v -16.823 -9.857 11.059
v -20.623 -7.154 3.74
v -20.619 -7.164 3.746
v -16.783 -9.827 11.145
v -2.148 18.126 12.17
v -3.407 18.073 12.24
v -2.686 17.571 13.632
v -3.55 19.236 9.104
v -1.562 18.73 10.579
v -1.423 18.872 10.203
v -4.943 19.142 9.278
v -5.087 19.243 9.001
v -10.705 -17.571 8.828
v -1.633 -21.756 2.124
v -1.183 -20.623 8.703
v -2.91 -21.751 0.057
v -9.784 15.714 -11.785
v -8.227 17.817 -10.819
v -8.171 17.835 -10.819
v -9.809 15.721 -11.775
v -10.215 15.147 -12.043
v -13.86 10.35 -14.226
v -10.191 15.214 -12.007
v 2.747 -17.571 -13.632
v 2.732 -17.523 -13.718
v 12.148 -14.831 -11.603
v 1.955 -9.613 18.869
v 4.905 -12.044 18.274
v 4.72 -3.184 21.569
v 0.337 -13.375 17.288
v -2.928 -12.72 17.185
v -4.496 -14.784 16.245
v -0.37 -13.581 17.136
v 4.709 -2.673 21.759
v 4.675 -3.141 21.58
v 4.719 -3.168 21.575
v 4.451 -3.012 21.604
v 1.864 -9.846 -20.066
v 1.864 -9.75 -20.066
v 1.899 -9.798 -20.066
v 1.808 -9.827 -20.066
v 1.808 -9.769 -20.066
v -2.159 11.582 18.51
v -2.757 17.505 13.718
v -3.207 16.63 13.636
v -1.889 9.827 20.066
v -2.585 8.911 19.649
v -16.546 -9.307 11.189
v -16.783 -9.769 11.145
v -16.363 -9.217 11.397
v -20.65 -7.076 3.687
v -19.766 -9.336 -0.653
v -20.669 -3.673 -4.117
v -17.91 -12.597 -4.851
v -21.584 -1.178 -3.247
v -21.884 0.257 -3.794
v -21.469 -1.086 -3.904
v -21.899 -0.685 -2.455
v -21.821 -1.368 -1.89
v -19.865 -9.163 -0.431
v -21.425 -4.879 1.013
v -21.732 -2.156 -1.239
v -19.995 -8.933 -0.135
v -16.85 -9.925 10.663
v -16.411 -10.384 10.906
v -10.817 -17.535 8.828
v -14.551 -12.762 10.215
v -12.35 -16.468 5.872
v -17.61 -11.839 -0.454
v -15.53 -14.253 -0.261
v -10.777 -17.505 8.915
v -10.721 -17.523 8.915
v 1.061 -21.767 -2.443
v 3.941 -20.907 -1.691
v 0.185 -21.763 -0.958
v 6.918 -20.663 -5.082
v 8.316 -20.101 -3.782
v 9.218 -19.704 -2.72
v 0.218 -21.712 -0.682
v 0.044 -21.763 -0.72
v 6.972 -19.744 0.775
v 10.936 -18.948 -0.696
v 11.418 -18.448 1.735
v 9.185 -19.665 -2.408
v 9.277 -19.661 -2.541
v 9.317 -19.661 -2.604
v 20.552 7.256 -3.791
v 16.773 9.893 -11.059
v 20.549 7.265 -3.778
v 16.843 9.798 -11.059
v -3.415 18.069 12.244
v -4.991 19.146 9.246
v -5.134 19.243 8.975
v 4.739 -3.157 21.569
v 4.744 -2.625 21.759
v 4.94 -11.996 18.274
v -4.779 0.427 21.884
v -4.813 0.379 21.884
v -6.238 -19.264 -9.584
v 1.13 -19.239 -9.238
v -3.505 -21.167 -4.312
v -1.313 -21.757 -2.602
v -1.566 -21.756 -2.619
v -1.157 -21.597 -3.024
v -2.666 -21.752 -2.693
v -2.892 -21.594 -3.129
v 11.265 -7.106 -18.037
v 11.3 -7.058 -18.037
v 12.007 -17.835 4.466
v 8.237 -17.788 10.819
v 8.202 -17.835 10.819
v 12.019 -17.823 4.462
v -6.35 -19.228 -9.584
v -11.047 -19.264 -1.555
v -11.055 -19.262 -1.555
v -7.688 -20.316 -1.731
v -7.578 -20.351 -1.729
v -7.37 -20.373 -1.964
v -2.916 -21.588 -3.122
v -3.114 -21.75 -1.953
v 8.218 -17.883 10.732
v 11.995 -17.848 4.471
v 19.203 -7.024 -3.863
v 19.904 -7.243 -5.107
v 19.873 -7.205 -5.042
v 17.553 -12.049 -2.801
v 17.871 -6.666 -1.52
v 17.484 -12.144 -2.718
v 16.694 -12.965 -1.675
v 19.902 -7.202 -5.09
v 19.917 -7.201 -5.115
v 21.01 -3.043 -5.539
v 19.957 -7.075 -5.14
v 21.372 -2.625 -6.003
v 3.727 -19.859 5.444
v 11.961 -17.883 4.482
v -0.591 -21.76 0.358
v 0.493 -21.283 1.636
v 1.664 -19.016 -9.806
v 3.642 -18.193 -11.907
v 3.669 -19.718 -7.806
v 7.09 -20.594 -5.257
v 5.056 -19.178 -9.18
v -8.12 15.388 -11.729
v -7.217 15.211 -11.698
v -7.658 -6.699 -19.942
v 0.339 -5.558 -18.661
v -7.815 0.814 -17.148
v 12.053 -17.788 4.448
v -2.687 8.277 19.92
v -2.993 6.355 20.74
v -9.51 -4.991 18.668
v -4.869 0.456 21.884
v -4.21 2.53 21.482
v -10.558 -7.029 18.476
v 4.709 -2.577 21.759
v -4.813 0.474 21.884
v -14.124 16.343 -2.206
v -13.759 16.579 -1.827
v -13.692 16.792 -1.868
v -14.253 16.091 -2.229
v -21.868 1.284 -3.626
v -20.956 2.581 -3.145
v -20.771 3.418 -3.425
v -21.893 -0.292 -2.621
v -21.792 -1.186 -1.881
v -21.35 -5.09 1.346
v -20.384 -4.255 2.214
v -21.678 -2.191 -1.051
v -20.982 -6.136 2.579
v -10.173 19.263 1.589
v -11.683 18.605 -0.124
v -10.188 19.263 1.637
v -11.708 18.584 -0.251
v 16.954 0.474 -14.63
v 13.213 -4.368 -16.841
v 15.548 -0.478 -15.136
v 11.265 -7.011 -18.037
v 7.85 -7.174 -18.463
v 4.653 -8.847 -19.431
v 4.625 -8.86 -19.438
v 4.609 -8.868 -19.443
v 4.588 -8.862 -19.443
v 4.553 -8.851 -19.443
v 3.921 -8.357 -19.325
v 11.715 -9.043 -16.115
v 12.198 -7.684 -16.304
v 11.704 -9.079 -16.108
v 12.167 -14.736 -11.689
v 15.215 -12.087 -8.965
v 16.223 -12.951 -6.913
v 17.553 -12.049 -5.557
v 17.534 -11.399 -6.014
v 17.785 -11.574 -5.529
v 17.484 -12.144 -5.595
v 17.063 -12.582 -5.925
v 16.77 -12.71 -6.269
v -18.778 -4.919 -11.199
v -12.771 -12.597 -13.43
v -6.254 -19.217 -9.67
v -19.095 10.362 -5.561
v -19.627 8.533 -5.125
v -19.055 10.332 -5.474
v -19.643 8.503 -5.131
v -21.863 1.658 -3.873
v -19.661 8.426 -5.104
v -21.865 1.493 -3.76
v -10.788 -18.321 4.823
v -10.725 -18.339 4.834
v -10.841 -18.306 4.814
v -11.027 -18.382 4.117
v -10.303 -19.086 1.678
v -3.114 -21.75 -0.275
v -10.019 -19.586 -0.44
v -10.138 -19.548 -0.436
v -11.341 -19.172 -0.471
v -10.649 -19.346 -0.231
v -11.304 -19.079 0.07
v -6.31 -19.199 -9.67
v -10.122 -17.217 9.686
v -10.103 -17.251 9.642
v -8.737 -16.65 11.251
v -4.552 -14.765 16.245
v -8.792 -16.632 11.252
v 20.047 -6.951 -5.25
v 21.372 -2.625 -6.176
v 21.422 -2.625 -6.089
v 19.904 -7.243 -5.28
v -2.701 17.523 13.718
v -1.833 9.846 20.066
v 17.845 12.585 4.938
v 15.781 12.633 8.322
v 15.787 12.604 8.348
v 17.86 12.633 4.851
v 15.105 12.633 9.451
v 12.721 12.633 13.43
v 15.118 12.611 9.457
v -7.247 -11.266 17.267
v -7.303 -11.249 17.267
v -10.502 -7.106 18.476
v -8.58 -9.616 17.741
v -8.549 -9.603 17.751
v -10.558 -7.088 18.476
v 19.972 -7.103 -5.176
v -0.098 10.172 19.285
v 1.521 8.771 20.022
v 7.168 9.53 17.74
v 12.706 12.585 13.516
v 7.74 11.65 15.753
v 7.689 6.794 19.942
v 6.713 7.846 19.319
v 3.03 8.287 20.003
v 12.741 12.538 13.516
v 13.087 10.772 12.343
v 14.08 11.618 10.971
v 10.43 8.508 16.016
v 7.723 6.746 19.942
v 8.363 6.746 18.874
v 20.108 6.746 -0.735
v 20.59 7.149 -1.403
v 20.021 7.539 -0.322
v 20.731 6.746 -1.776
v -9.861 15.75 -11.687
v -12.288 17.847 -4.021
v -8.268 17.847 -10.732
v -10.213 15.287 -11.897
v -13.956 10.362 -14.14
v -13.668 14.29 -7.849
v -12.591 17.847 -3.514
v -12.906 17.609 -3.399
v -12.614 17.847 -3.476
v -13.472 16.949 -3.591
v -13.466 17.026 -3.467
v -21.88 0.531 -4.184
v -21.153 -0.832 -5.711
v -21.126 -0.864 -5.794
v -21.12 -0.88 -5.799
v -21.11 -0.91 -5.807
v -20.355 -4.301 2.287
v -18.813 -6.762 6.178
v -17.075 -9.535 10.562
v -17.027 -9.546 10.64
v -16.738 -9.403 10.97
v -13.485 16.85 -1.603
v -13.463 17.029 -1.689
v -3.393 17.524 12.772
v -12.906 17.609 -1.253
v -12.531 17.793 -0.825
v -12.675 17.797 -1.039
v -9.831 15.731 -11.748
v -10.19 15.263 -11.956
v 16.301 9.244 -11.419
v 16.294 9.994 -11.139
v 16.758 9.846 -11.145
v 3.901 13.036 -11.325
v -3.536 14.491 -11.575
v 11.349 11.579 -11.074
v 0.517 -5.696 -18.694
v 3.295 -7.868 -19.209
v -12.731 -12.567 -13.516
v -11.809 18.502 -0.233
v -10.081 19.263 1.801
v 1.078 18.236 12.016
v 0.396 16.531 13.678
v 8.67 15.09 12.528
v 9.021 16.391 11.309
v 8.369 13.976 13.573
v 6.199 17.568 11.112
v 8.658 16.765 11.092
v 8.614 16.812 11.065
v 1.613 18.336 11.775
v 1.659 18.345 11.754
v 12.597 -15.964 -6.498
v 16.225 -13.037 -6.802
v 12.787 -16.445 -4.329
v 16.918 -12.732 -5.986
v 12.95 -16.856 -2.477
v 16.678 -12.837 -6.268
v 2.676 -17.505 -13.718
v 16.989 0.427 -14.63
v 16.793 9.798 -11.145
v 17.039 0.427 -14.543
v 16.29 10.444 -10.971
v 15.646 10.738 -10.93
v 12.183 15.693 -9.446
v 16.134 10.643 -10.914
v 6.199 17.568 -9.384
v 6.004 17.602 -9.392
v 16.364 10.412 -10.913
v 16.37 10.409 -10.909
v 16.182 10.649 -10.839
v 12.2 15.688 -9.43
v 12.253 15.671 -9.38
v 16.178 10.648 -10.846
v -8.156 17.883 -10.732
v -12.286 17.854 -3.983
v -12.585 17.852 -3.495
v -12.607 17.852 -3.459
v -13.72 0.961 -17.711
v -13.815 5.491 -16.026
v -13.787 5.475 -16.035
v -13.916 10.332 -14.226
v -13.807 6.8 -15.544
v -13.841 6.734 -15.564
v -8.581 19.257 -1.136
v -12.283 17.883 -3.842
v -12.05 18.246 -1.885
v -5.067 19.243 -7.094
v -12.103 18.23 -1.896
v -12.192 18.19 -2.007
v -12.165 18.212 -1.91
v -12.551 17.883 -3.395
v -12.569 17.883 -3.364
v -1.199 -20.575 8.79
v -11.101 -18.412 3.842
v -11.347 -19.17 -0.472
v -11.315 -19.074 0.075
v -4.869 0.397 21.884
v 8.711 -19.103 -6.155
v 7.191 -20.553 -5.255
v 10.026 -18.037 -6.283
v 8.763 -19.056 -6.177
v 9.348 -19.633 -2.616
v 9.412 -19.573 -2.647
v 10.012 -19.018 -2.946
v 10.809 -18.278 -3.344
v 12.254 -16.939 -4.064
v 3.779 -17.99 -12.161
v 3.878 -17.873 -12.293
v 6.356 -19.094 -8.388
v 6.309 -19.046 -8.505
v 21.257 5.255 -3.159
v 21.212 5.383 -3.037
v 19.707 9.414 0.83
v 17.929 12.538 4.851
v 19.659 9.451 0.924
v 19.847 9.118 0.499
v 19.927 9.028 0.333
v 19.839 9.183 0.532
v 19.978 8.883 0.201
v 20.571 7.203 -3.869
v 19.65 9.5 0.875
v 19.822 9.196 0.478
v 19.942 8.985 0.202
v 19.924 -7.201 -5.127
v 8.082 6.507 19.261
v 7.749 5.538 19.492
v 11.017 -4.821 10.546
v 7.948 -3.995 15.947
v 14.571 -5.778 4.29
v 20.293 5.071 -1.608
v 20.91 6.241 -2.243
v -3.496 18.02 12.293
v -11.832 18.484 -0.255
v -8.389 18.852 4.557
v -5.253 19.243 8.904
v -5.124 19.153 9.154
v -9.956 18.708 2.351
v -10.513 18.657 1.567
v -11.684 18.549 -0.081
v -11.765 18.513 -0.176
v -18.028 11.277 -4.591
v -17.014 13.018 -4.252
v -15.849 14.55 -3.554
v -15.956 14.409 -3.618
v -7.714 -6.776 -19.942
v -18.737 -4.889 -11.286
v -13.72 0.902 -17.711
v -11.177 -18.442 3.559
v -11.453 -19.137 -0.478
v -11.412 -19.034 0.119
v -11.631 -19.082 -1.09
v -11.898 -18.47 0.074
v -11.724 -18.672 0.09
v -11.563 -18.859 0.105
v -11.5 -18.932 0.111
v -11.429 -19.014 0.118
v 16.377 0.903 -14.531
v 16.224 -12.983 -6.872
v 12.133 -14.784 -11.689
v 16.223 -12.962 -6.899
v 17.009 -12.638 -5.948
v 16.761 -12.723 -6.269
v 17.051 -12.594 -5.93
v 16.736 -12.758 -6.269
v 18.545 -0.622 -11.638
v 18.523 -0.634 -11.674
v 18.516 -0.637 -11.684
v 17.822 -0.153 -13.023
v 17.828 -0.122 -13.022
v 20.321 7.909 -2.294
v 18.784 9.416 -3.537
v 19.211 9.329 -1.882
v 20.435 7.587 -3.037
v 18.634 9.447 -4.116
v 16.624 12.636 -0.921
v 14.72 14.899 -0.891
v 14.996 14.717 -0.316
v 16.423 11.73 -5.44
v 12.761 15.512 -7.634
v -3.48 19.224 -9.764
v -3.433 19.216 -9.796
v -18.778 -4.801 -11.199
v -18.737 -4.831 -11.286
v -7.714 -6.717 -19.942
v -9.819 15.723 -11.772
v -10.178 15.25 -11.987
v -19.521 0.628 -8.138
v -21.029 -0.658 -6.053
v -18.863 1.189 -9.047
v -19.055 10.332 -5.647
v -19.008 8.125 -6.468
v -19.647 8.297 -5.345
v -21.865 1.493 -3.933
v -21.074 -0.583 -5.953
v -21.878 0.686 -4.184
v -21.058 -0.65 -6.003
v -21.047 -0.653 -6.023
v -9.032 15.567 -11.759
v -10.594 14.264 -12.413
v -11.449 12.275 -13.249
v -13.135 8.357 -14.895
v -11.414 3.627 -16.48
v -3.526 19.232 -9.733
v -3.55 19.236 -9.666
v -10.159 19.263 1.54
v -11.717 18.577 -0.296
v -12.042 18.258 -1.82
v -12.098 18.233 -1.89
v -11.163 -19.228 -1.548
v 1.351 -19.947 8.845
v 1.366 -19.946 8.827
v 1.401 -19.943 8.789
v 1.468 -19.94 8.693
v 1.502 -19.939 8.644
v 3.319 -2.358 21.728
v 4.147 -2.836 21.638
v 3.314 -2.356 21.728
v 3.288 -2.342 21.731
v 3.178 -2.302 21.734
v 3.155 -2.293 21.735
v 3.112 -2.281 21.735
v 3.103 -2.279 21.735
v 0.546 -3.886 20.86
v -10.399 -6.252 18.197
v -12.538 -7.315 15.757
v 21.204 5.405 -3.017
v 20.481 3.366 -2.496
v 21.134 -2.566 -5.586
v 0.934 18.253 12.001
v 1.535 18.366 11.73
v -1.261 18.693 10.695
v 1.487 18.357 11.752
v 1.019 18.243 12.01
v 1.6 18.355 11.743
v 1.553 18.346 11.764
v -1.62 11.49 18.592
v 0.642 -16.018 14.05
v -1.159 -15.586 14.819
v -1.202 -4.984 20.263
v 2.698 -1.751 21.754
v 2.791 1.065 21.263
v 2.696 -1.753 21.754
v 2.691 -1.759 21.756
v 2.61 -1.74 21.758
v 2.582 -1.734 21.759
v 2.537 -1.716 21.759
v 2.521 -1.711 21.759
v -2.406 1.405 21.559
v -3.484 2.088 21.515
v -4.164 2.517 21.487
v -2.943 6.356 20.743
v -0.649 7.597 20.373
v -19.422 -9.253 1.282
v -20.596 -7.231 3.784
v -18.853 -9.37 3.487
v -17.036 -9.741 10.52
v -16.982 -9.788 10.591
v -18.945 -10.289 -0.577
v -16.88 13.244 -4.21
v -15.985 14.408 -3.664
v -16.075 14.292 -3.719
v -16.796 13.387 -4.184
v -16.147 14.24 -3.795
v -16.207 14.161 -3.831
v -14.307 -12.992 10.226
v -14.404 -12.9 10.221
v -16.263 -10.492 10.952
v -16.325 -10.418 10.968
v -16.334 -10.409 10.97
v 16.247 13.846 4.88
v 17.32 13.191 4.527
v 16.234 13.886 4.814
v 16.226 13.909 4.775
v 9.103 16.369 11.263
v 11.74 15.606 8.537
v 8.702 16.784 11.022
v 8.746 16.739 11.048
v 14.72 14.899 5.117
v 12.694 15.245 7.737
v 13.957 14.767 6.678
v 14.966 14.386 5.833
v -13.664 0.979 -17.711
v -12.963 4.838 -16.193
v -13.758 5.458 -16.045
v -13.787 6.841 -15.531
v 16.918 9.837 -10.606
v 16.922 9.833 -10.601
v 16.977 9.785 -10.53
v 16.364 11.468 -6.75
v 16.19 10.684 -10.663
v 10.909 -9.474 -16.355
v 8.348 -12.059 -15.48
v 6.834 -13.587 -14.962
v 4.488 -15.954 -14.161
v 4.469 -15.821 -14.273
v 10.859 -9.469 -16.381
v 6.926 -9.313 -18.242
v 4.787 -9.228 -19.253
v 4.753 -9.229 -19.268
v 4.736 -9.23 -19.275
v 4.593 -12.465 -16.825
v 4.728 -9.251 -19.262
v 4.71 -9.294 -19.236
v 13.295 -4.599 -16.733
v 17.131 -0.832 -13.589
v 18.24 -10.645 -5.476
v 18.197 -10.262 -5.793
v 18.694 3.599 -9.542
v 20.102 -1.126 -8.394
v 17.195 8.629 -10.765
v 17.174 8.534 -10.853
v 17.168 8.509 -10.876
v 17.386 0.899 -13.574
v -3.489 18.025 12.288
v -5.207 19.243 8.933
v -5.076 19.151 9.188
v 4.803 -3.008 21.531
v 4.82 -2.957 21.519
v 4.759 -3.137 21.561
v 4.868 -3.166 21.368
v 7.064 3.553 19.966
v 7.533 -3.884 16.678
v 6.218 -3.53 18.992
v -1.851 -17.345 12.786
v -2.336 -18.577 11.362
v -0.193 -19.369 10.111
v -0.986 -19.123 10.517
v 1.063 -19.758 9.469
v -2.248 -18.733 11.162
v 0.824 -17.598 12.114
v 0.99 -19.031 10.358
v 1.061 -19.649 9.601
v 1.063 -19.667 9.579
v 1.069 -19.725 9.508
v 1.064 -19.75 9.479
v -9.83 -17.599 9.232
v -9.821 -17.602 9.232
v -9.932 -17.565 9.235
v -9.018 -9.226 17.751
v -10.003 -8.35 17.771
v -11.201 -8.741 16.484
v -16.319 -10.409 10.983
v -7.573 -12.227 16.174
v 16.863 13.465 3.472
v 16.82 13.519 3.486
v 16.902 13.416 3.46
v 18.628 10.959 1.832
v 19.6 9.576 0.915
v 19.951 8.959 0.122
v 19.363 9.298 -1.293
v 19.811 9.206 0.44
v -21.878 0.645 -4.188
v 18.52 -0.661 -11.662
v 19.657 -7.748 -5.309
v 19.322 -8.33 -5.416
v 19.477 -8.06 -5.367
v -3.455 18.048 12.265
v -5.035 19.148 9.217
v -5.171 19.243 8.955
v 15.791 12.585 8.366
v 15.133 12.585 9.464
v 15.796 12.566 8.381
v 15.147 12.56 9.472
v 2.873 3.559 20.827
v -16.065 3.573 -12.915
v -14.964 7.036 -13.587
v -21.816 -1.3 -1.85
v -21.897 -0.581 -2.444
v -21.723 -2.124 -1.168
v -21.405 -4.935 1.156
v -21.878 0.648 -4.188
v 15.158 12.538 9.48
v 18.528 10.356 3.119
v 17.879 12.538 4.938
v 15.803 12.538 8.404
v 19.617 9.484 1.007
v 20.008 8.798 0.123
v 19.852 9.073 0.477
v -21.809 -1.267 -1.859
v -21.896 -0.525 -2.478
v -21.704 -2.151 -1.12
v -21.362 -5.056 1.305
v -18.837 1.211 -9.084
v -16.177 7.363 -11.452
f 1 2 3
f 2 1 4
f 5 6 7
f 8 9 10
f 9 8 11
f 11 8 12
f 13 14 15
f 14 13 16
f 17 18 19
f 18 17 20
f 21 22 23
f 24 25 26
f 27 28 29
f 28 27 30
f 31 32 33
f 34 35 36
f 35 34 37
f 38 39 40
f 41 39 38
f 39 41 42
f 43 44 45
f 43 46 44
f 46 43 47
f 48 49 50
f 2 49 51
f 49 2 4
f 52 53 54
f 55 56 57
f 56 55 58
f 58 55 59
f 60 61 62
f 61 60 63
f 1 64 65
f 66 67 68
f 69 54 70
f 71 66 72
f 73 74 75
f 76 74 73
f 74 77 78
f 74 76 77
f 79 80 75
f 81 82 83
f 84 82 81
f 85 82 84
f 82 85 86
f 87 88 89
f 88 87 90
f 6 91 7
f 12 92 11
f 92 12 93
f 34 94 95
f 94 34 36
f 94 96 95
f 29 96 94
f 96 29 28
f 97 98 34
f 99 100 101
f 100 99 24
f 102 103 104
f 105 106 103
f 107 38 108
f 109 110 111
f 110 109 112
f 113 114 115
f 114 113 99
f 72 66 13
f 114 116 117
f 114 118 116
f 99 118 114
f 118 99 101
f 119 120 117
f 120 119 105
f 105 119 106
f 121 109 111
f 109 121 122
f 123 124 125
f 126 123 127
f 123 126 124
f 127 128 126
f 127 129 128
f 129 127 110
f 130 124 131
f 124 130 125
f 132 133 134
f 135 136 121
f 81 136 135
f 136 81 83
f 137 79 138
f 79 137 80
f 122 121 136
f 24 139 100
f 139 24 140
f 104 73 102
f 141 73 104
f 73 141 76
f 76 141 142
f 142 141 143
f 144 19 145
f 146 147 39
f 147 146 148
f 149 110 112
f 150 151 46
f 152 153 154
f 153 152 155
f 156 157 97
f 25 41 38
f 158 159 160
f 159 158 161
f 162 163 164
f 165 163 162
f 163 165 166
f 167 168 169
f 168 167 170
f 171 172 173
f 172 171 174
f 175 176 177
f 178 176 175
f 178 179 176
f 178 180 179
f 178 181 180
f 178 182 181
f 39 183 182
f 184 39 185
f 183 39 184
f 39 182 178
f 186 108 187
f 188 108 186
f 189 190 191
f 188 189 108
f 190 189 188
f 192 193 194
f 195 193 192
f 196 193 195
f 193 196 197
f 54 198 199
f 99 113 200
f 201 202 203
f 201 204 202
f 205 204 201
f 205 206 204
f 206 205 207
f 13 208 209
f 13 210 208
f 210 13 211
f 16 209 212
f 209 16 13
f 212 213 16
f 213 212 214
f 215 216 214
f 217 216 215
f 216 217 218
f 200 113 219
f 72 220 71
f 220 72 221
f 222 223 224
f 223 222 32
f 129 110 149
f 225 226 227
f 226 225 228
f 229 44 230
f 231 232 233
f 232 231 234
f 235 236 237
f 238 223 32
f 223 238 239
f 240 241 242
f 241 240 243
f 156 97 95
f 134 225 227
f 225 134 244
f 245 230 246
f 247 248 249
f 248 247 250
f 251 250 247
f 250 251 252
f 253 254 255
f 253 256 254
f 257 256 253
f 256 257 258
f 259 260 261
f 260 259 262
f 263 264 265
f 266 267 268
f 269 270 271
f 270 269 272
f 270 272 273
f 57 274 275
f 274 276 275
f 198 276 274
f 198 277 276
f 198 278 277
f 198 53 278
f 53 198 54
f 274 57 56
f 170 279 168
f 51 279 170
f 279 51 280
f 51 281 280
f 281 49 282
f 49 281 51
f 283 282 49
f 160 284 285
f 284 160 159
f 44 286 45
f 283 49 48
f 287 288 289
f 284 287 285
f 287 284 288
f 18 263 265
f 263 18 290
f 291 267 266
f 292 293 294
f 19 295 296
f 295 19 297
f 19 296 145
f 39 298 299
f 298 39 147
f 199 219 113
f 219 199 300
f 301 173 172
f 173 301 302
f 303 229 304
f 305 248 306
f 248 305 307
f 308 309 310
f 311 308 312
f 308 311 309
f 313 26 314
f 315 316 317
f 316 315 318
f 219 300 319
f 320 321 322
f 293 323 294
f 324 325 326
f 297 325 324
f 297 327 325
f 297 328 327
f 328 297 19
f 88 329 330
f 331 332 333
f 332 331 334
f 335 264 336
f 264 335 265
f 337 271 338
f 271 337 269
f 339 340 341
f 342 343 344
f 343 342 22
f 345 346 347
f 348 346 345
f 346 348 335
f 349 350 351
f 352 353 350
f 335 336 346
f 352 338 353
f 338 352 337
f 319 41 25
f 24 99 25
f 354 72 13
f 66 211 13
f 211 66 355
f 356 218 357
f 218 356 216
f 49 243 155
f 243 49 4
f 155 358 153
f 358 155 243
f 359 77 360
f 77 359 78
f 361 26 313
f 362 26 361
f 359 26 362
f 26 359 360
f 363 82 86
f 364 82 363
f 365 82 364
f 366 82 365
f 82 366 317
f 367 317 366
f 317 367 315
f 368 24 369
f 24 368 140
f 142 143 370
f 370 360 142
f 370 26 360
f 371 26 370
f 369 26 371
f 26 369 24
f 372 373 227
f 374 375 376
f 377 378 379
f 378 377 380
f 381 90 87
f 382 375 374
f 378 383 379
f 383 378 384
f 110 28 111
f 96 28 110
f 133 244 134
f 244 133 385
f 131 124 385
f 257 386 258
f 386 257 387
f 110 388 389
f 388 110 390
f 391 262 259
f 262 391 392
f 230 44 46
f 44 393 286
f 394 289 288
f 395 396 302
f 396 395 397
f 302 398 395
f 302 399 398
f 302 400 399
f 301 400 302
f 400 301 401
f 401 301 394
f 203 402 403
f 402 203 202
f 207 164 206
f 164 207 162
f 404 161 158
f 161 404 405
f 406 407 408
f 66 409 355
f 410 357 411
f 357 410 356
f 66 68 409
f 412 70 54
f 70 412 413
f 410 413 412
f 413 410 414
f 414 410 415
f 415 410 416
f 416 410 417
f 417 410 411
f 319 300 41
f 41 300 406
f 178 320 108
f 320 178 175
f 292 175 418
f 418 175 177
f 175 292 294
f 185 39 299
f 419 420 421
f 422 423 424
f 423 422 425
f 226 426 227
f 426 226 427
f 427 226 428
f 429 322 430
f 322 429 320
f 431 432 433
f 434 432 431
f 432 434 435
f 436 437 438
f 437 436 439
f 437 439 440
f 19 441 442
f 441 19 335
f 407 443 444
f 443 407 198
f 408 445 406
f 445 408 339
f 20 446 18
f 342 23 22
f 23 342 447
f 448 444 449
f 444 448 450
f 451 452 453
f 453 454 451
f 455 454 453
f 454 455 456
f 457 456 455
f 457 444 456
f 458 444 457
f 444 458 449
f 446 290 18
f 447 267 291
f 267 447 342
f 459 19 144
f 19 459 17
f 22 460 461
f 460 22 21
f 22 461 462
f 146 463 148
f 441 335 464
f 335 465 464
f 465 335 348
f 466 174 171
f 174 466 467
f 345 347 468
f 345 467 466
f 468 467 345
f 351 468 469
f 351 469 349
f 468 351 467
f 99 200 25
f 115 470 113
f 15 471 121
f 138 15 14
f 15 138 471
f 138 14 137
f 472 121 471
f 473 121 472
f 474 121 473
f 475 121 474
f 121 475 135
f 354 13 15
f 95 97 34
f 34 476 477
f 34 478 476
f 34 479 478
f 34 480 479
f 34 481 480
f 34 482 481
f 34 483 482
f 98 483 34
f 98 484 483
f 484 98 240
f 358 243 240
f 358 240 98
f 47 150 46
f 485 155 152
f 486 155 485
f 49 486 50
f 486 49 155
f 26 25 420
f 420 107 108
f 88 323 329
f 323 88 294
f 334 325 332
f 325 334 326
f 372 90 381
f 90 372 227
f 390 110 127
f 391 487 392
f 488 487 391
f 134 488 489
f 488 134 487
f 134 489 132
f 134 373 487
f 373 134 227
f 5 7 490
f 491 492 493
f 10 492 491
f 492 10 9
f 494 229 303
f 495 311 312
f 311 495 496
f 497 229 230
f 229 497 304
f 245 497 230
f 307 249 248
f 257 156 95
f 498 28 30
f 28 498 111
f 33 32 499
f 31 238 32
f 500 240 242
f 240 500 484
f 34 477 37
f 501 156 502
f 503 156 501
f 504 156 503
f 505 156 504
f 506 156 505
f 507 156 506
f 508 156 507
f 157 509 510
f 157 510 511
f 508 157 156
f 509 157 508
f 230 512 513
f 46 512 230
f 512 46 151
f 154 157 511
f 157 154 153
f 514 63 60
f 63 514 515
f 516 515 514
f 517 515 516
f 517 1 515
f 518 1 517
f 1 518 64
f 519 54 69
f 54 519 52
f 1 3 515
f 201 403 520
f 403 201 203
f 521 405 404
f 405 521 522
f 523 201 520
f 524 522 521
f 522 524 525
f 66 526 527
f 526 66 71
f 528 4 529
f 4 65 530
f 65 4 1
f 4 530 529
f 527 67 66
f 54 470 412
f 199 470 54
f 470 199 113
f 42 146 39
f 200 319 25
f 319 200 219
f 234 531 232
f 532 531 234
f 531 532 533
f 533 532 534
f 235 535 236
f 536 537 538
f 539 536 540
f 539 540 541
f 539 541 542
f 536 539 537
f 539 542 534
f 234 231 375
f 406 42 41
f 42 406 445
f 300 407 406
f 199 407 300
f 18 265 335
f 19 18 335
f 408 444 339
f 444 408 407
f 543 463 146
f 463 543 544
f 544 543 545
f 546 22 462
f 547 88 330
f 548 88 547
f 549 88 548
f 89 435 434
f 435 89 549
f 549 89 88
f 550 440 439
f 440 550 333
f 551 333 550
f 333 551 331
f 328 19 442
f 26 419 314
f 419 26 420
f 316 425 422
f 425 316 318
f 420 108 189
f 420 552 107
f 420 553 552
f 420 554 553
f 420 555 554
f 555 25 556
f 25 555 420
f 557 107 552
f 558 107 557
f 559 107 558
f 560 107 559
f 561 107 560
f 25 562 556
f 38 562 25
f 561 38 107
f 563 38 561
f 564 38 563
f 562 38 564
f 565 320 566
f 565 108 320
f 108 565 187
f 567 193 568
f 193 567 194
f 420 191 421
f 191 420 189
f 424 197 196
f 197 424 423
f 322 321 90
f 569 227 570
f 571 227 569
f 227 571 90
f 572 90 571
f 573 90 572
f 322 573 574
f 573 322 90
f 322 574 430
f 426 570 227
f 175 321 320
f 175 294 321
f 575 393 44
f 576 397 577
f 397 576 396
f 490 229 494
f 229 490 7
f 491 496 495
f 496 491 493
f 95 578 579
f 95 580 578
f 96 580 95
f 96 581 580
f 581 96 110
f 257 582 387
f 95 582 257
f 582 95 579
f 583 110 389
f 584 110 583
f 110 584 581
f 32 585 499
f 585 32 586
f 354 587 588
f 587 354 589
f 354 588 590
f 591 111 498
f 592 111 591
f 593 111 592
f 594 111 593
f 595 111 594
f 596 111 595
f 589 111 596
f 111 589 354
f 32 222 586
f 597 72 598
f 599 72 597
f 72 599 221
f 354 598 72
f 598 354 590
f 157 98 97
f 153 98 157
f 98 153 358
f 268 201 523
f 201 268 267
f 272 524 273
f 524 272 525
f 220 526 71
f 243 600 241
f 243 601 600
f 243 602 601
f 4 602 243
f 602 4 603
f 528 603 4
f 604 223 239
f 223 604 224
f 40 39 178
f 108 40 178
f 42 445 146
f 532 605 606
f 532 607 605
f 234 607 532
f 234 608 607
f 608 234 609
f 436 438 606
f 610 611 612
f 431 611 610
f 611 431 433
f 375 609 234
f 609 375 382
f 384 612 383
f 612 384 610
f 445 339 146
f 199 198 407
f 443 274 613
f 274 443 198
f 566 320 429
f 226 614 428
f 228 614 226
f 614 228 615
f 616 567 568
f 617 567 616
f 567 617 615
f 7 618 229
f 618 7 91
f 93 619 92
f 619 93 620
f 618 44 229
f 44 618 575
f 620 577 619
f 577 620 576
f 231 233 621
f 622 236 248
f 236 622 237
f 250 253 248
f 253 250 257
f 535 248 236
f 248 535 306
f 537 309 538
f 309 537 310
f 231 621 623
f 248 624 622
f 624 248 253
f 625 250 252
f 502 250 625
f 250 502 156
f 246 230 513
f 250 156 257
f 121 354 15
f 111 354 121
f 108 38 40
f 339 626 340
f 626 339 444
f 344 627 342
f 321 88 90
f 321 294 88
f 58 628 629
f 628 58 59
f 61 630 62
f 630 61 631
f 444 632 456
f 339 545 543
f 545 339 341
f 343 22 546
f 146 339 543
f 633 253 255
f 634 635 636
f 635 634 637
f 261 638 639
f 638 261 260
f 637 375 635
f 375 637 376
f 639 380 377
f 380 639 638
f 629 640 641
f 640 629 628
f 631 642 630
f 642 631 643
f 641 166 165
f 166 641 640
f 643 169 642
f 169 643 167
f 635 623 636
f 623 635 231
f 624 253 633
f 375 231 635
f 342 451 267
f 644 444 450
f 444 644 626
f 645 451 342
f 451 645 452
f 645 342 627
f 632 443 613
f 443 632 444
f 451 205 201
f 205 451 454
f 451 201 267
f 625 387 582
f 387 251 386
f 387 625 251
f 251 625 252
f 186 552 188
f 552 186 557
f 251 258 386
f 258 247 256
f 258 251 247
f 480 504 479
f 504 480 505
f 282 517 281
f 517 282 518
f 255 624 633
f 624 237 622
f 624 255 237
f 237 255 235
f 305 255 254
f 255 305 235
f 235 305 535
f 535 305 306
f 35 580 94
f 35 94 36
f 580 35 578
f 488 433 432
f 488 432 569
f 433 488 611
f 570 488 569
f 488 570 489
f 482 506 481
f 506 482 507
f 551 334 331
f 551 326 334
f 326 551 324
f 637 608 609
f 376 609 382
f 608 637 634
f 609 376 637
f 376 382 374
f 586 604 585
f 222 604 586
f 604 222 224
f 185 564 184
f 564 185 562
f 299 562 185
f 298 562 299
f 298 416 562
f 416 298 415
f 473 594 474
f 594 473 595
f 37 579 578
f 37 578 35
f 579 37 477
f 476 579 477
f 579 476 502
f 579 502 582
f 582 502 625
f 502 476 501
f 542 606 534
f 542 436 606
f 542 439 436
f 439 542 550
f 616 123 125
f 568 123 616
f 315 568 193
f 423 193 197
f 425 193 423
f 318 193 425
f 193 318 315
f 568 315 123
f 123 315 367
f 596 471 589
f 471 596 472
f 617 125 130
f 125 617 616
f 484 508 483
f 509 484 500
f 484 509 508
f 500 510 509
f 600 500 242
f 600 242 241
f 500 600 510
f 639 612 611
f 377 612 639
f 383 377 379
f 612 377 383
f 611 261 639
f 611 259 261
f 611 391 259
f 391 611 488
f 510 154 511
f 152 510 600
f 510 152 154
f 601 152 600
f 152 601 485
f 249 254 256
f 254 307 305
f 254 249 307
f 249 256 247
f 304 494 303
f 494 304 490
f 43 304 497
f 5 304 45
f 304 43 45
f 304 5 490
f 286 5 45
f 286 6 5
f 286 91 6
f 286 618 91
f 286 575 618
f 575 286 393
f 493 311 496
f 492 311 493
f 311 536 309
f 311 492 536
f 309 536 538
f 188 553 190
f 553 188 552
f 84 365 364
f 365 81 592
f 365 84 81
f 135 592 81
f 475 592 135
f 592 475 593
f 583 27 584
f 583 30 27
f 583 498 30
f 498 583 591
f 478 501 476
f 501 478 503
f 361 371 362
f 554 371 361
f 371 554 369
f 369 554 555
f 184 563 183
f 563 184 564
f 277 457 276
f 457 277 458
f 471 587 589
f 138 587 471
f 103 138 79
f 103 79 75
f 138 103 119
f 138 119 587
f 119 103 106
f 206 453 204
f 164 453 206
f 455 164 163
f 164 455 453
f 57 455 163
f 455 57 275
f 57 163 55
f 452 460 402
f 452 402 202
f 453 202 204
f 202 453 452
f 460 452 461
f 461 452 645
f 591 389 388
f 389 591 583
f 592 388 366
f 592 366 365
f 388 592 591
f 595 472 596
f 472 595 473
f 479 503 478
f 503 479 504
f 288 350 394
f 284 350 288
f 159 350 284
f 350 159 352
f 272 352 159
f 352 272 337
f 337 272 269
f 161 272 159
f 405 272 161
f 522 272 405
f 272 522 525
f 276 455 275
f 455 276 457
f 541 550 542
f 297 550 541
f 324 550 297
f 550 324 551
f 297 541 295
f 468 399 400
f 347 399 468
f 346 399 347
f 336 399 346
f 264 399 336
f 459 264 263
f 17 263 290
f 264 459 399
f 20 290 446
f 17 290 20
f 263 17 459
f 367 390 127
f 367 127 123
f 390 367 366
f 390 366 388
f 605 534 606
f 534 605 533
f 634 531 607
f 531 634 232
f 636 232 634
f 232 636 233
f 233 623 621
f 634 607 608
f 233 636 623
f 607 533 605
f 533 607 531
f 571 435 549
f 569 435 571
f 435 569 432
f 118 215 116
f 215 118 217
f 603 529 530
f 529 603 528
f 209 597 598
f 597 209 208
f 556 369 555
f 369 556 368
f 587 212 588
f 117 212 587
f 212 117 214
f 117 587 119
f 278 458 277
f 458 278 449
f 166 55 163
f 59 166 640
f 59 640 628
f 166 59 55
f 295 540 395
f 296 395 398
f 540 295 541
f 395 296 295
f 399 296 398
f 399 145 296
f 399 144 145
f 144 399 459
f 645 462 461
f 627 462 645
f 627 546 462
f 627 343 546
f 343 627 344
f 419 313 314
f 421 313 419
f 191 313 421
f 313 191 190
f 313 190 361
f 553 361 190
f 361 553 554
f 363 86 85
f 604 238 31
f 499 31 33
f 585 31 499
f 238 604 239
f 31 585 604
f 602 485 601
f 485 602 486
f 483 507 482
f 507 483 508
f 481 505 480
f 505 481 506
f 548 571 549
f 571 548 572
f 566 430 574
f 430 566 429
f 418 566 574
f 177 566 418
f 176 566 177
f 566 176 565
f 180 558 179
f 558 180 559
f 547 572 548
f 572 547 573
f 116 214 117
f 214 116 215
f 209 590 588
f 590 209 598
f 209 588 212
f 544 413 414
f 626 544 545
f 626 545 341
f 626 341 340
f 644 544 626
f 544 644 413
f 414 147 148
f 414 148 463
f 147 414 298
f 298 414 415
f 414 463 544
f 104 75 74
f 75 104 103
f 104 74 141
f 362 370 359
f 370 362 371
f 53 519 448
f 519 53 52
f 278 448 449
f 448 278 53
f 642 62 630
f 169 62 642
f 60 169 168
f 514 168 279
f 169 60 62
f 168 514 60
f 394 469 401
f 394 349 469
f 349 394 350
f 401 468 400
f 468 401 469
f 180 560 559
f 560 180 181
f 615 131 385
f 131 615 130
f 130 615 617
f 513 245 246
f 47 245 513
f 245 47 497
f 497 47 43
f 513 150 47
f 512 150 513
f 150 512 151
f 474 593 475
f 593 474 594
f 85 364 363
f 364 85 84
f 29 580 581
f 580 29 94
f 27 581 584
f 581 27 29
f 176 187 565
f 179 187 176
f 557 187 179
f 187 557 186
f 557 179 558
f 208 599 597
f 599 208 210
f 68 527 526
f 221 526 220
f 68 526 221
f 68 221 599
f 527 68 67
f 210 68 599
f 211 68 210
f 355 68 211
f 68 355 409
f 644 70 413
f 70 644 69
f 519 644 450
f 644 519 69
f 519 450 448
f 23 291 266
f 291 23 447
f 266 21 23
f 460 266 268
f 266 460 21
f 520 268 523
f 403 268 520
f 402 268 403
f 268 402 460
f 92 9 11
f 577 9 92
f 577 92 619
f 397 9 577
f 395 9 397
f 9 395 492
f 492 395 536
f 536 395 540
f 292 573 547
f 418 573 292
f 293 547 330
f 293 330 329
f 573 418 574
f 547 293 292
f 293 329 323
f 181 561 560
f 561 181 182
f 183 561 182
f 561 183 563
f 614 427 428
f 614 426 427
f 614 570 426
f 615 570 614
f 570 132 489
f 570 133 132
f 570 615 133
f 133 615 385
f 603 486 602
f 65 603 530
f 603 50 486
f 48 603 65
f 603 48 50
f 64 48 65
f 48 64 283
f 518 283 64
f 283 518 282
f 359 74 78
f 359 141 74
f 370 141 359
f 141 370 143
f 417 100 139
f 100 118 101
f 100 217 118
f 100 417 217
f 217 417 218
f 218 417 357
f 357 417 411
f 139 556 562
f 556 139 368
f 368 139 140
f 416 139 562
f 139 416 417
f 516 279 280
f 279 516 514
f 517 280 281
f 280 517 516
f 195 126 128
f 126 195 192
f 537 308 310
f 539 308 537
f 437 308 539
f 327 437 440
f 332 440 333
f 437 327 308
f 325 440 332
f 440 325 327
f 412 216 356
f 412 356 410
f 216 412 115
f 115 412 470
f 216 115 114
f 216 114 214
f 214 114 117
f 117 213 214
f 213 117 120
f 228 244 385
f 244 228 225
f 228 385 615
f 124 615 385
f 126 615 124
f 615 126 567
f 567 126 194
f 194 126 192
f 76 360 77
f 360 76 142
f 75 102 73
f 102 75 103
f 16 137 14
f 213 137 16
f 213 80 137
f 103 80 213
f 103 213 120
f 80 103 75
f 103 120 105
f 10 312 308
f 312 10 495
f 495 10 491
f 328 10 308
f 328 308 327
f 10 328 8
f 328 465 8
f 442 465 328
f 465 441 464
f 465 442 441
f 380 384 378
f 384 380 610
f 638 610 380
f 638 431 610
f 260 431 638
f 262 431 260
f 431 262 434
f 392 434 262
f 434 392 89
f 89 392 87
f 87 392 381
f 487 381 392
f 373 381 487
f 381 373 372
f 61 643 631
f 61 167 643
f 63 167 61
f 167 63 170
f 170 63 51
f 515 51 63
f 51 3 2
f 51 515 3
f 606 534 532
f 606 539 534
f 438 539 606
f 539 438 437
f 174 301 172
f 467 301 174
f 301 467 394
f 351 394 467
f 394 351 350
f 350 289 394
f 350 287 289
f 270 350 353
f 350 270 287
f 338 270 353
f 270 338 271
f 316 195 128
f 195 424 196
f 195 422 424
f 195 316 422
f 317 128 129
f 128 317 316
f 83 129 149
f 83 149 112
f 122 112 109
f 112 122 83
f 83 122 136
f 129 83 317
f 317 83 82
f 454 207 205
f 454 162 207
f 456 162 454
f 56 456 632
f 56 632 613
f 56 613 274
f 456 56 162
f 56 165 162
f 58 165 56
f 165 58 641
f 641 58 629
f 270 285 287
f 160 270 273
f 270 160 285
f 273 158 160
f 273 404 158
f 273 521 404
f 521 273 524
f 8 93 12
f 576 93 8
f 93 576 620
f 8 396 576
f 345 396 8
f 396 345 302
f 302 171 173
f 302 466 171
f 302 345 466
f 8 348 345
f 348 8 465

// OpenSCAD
// Auto-generated OpenSCAD file

    inner_points = 10*[[2.1663170564831677, -0.34419785617257703, -0.38765607758297516], [-1.442996025981491, 0.7866986144158923, 1.519751628063399], [1.8552345149142868, 0.08938090208747582, -1.233372999913796], [-1.7540785675503718, 1.2202773726759453, 0.6740347057325782], [1.7453064030745096, -1.2048588295271065, -0.6740347057325782], [-1.864006679390149, -0.07396235893863715, 1.233372999913796], [1.4342238615056286, -0.7712800712670536, -1.519751628063399], [-2.1750892209590305, 0.35961639932141576, 0.38765607758297516], [1.468891681862331, 1.4803448655131184, 0.8042791895681101], [0.6168484423213675, 1.7473133080865888, 1.2545570689075638], [-0.31453806522834865, -2.1654735231978033, -0.4088401465767429], [-1.1665813047693123, -1.8985050806243329, 0.0414377327627109], [0.43898102104550846, -0.34681056725634735, 2.1595854401021617], [-0.026742532112712505, 1.2228900837597156, -1.873206811952559], [-0.8787857716536761, 1.489858526333186, -1.4229289326131052], [0.0179703676368501, -1.207471540610877, 1.873206811952559], [-0.44775318552137083, 0.36222911040518607, -2.1595854401021617], [-1.2997964250623344, 0.6291975529786564, -1.7093075607627082], [-1.1385344489428022, -0.0769022418107572, 1.921618159677706], [1.12976228446694, 0.09232078495959586, -1.921618159677706], [-1.9529591160768351, 1.0582216841140362, -0.29249748784533813], [1.872568425092638, 1.215193370477562, -0.07135759109804152], [-0.358109735910173, 1.914125827058532, 1.1074852013948724], [0.3493375714343106, -1.8987072839096932, -1.1074852013948724], [-1.8813405895685003, -1.1997748273287232, 0.07135759109804152], [1.1094776222383604, 0.34997776999835917, 1.9047907760005465], [0.007257421988691212, -1.903261911034367, 1.1550417938533186], [2.1770300021313265, 0.35159251425091276, 0.33050894051626534], [-0.5802398407923681, 1.2155205422659117, 1.7876387668231855], [1.673687876566175, 1.0531376819156528, -1.0378897846759576], [-1.0835819663575201, 1.9170657099306518, 0.4192400416309626], [1.0748098018816579, -1.9016471667818131, -0.4192400416309626], [-1.6824600410420372, -1.037719138766814, 1.0378897846759576], [0.5714676763165056, -1.200101999117073, -1.7876387668231855], [-2.185802166607189, -0.33617397110207403, -0.33050894051626534], [1.7733532589010197, 0.6167440092864692, 1.206145721182417], [0.3947183374391723, 1.0487080232939685, 1.9347106343358773], [0.4109341652189982, -2.168413406069923, 0.2794050131871669], [-0.9677007562428493, -1.736449392062424, 1.0079699263406272], [-0.2757782637536796, 0.35191968603926227, 2.1895052984374925], [0.948215646118828, 1.056077564787773, -1.7261349444398677], [-1.282462514883983, 1.7550100213687425, -0.5472921519469536], [-0.9569878105946905, -1.0406590216389342, 1.7261349444398677], [0.2670060992778172, -0.33650114289042354, -2.1895052984374925], [-1.9636720617249939, 0.3624313136905462, -1.0106625059445786]];

    outer_points = 10*[[1.269058091079478, 1.2537842356028754, 1.3429760346034532], [-1.1407886362053834, -1.916917683440805, -0.10047815641416535], [0.6269353347347499, 1.916917683440805, 0.9583562273355116], [-1.7829113925501114, -1.2537842356028754, -0.4850979636821068], [1.7829113925501114, 1.2537842356028754, 0.4850979636821068], [-0.6269353347347499, -1.916917683440805, -0.9583562273355116], [1.1407886362053834, 1.916917683440805, 0.10047815641416535], [-1.269058091079478, -1.2537842356028754, -1.3429760346034532], [-0.48285355807647146, 0.04268387072270685, 2.179701471792137], [-1.0517412010710958, -0.7058173185606367, 1.8389481603050128], [1.693863957415824, 0.04268387072270685, -1.4543283530370714], [1.1249763144211997, -0.7058173185606367, -1.7950816645241956], [0.8186673506552729, -1.7787897762393126, 1.073200204257045], [-1.3325206521259063, 1.7787897762393126, -0.21532213333569883], [-1.9014082951205304, 1.0302885869559693, -0.556075444822823], [1.3325206521259063, -1.7787897762393126, 0.21532213333569883], [-0.8186673506552729, 1.7787897762393126, -1.073200204257045], [-1.387554993649897, 1.0302885869559693, -1.4139535157441694], [-0.18857781353705078, -2.2221043244817307, -0.11295466728279542], [0.18857781353705078, 2.2221043244817307, 0.11295466728279542], [-1.8696770145973163, -0.48599841896512486, -1.1199023954567], [-0.1848857624061775, 0.979800777081756, 1.9979678850244973], [-1.6742529475459202, -0.979800777081756, 1.1058641337721262], [1.6742529475459202, 0.979800777081756, -1.1058641337721262], [0.1848857624061775, -0.979800777081756, -1.9979678850244973], [0.4889682744617646, -1.1996196766772678, 1.8187607416585618], [1.834253682943229, -1.1996196766772678, -0.42719320621671564], [0.7673250602621547, 0.6746141360408304, 1.9854913741558673], [-1.073634024028082, -1.7475865937195063, 0.8827904946253733], [-0.27165138445338266, 1.7475865937195063, 1.3631634532499042], [-2.112610468743619, -0.6746141360408304, 0.26046257371941006], [2.112610468743619, 0.6746141360408304, -0.26046257371941006], [0.27165138445338266, -1.7475865937195063, -1.3631634532499042], [1.073634024028082, 1.7475865937195063, -0.8827904946253733], [-0.7673250602621547, -0.6746141360408304, -1.9854913741558673], [0.469357264591861, -0.26250277031821867, 2.167224960923507], [-0.4511222775532575, -1.473603135198387, 1.6158745211582601], [2.1322214786135234, -0.26250277031821867, -0.6089267929843553], [1.2117419364684048, -1.473603135198387, -1.1602772327496023], [-0.12142320135974954, -2.0527732347604317, 0.8703139837567432], [-0.7100089056510817, 2.0527732347604317, 0.517761893197188], [-2.1993760907908246, 0.09317168059691994, -0.3743418580551833], [0.7100089056510817, -2.0527732347604317, -0.517761893197188], [0.12142320135974954, 2.0527732347604317, -0.8703139837567432], [-1.3679439837799934, 0.09317168059691994, -1.7624177350091146]];

    // Convex hull for inner set (I)
    module inner_hull() {
        hull() {
            for (p = inner_points) {
                translate(p) sphere(r=0.1);
            }
        }
    }

    // Convex hull for outer set (O) minus inner hull (O \ I)
    module outer_minus_inner() {
        difference() {
            hull() {
                for (p = outer_points) {
                    translate(p) sphere(r=0.1);
                }
            }
            inner_hull(); // Subtract inner hull
        }
    }

    // Convex hull for outer set (O) minus all translated inner hulls
    module outer_minus_AllTranslationInner() {
        difference() {
            hull() {
                for (p = outer_points) {
                    translate(p) sphere(r=0.1);
                }
            }
            hull() {
                translate([0,0,50]) inner_hull();
                translate([0,0,-50]) inner_hull();
            }; // Subtract translated inner hulls
        }
    }

    // Difference between outer_minus_inner and outer_minus_AllTranslationInner
    module outer_minus_inner_diff() {
        difference() {
            // Outer minus inner
            difference() {
                hull() {
                    for (p = outer_points) {
                        translate(p) sphere(r=0.1);
                    }
                }
                inner_hull();
            }

            // Subtract Outer minus AllTranslationInner
            difference() {
                hull() {
                    for (p = outer_points) {
                        translate(p) sphere(r=0.1);
                    }
                }
                hull() {
                    translate([0,0,50]) inner_hull();
                    translate([0,0,-50]) inner_hull();
                };
            }
        }
    }

    // Rendering all with colors applied
    color([1, 1, 0, 1]) outer_minus_inner_diff(); // Opaque yellow
    
